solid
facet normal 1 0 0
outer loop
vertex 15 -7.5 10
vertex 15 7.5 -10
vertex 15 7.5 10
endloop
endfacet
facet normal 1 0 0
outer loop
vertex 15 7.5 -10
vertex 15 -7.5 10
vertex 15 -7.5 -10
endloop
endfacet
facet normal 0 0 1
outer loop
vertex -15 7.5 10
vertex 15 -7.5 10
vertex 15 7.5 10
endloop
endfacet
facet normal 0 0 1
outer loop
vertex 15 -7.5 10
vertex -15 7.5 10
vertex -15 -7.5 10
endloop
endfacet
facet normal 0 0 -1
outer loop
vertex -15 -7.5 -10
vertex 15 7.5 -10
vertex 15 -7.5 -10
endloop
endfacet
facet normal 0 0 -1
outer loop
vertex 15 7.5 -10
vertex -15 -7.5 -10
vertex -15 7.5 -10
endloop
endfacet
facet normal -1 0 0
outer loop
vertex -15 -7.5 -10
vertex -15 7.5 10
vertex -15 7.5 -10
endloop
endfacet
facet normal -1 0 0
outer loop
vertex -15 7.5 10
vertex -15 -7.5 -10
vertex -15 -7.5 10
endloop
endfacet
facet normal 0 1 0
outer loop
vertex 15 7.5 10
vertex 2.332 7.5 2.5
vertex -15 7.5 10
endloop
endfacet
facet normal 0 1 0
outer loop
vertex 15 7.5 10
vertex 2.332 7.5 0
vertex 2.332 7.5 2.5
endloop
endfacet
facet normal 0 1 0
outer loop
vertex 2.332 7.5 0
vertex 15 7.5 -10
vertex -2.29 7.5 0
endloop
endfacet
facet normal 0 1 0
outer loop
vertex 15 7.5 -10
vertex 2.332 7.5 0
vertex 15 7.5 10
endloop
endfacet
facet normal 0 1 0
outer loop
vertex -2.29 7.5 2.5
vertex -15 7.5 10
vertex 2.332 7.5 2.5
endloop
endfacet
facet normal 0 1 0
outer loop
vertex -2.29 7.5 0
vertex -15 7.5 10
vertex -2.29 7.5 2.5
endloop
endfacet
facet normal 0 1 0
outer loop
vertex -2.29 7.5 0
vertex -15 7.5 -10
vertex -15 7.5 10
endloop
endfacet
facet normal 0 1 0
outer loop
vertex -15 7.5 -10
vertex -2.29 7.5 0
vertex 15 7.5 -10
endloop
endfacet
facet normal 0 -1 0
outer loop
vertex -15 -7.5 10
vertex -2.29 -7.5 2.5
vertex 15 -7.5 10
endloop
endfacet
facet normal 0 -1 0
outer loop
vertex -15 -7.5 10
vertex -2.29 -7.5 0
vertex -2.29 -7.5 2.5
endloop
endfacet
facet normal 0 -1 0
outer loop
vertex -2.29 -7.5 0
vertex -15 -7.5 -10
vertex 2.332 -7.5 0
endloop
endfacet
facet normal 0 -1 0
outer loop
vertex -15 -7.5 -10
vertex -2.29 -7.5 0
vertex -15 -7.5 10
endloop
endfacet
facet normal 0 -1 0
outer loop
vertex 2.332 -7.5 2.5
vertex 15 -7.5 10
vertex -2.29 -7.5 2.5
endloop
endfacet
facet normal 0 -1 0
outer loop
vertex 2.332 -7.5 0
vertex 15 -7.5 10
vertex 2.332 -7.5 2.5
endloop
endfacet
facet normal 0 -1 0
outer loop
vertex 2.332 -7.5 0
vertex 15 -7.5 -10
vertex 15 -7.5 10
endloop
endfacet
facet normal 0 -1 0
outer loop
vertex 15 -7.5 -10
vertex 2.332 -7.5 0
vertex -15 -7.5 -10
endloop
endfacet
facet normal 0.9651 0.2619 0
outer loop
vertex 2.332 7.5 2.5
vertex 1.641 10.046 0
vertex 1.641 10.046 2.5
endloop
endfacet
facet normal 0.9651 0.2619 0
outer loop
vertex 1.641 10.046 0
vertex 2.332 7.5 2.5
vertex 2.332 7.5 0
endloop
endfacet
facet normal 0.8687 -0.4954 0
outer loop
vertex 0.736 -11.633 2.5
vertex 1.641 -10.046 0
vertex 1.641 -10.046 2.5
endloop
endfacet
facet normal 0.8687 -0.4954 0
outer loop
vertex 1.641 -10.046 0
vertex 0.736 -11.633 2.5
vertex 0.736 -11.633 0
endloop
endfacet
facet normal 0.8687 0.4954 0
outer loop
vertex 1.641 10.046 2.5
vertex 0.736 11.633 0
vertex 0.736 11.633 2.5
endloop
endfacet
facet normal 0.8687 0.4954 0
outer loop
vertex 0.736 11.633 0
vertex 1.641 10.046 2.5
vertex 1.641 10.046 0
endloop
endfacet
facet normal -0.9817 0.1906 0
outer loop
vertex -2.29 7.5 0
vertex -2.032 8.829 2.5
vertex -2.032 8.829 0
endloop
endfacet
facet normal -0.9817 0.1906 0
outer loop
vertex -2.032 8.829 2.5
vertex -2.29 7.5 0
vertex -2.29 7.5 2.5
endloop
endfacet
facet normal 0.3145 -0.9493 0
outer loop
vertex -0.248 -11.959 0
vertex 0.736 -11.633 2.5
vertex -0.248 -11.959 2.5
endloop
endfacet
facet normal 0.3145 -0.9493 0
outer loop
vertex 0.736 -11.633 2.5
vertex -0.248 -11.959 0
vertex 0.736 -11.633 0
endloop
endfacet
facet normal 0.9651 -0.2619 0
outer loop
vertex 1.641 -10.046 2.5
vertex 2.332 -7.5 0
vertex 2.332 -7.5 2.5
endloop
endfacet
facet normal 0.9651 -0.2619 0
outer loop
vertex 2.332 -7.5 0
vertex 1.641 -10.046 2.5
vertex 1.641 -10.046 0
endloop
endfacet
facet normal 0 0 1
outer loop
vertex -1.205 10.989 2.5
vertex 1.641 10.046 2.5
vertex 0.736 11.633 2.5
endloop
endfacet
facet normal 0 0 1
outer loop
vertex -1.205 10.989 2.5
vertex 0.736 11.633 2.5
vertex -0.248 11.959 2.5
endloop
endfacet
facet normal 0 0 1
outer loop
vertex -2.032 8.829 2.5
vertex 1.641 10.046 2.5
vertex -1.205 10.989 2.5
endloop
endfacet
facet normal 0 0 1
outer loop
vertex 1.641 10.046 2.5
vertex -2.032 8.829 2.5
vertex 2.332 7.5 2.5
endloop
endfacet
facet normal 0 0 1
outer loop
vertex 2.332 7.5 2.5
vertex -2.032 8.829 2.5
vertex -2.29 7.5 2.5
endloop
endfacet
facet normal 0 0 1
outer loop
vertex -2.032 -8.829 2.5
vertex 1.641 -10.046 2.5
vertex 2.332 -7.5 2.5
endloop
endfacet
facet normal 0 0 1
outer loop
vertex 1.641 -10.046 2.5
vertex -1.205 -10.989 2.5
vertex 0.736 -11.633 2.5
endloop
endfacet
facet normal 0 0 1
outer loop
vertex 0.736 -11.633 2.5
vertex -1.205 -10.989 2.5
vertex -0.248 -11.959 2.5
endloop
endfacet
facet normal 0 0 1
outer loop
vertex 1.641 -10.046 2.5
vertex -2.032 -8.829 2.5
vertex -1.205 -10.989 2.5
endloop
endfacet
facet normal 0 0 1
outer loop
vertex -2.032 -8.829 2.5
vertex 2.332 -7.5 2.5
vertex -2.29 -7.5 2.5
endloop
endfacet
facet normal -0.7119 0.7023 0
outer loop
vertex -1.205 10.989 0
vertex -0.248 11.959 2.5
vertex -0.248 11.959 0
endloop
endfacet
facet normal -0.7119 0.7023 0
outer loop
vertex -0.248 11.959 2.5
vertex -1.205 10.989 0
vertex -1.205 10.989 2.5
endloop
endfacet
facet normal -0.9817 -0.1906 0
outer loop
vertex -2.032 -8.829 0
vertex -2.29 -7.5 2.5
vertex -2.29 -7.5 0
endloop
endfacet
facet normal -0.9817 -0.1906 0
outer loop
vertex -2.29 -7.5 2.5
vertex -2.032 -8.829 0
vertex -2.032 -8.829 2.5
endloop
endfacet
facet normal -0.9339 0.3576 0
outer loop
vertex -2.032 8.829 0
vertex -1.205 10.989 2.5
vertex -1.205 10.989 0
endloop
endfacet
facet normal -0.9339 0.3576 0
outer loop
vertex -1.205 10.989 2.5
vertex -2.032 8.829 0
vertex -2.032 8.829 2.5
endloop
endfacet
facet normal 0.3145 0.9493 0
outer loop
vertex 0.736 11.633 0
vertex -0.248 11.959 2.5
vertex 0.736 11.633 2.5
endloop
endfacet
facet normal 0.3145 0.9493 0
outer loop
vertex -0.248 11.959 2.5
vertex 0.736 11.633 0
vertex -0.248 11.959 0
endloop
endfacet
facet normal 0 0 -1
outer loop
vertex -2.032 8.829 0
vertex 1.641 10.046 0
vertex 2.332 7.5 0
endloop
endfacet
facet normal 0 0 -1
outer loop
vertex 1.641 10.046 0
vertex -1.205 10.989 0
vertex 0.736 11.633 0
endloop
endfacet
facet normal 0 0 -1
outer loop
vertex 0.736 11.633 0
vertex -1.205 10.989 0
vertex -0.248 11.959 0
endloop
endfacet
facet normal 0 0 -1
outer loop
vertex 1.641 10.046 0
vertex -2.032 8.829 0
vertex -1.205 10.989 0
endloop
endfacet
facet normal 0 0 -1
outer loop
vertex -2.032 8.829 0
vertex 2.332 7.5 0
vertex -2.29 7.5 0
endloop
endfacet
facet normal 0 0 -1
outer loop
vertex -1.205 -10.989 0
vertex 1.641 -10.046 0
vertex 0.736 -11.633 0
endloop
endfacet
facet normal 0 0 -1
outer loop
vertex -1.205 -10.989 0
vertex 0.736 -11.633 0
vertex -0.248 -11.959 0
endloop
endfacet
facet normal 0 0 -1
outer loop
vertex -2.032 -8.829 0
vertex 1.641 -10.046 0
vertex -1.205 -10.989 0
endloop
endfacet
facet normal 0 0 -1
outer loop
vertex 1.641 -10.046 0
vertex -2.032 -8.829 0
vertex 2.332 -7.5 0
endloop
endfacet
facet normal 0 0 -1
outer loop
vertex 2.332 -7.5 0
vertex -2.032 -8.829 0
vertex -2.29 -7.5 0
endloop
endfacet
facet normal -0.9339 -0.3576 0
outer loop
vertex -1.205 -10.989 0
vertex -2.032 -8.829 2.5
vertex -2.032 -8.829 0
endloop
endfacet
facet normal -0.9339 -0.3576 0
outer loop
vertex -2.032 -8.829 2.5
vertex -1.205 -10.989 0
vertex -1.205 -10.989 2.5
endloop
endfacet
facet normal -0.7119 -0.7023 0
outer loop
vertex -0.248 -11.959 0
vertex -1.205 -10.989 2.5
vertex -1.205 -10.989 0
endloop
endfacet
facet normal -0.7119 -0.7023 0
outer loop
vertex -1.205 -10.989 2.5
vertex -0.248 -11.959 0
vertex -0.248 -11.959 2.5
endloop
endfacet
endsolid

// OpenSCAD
// Generated by generate_scads.py
union() {
  cube(size=[30,15,20], center=true);
  scale([0.5,2.0,0.5]) {
    cylinder(h=5, r=6, center=false);
  }
  scale([1.0,1.5,0.5]) {
    cylinder(h=25, r=4, center=true);
  }
}
